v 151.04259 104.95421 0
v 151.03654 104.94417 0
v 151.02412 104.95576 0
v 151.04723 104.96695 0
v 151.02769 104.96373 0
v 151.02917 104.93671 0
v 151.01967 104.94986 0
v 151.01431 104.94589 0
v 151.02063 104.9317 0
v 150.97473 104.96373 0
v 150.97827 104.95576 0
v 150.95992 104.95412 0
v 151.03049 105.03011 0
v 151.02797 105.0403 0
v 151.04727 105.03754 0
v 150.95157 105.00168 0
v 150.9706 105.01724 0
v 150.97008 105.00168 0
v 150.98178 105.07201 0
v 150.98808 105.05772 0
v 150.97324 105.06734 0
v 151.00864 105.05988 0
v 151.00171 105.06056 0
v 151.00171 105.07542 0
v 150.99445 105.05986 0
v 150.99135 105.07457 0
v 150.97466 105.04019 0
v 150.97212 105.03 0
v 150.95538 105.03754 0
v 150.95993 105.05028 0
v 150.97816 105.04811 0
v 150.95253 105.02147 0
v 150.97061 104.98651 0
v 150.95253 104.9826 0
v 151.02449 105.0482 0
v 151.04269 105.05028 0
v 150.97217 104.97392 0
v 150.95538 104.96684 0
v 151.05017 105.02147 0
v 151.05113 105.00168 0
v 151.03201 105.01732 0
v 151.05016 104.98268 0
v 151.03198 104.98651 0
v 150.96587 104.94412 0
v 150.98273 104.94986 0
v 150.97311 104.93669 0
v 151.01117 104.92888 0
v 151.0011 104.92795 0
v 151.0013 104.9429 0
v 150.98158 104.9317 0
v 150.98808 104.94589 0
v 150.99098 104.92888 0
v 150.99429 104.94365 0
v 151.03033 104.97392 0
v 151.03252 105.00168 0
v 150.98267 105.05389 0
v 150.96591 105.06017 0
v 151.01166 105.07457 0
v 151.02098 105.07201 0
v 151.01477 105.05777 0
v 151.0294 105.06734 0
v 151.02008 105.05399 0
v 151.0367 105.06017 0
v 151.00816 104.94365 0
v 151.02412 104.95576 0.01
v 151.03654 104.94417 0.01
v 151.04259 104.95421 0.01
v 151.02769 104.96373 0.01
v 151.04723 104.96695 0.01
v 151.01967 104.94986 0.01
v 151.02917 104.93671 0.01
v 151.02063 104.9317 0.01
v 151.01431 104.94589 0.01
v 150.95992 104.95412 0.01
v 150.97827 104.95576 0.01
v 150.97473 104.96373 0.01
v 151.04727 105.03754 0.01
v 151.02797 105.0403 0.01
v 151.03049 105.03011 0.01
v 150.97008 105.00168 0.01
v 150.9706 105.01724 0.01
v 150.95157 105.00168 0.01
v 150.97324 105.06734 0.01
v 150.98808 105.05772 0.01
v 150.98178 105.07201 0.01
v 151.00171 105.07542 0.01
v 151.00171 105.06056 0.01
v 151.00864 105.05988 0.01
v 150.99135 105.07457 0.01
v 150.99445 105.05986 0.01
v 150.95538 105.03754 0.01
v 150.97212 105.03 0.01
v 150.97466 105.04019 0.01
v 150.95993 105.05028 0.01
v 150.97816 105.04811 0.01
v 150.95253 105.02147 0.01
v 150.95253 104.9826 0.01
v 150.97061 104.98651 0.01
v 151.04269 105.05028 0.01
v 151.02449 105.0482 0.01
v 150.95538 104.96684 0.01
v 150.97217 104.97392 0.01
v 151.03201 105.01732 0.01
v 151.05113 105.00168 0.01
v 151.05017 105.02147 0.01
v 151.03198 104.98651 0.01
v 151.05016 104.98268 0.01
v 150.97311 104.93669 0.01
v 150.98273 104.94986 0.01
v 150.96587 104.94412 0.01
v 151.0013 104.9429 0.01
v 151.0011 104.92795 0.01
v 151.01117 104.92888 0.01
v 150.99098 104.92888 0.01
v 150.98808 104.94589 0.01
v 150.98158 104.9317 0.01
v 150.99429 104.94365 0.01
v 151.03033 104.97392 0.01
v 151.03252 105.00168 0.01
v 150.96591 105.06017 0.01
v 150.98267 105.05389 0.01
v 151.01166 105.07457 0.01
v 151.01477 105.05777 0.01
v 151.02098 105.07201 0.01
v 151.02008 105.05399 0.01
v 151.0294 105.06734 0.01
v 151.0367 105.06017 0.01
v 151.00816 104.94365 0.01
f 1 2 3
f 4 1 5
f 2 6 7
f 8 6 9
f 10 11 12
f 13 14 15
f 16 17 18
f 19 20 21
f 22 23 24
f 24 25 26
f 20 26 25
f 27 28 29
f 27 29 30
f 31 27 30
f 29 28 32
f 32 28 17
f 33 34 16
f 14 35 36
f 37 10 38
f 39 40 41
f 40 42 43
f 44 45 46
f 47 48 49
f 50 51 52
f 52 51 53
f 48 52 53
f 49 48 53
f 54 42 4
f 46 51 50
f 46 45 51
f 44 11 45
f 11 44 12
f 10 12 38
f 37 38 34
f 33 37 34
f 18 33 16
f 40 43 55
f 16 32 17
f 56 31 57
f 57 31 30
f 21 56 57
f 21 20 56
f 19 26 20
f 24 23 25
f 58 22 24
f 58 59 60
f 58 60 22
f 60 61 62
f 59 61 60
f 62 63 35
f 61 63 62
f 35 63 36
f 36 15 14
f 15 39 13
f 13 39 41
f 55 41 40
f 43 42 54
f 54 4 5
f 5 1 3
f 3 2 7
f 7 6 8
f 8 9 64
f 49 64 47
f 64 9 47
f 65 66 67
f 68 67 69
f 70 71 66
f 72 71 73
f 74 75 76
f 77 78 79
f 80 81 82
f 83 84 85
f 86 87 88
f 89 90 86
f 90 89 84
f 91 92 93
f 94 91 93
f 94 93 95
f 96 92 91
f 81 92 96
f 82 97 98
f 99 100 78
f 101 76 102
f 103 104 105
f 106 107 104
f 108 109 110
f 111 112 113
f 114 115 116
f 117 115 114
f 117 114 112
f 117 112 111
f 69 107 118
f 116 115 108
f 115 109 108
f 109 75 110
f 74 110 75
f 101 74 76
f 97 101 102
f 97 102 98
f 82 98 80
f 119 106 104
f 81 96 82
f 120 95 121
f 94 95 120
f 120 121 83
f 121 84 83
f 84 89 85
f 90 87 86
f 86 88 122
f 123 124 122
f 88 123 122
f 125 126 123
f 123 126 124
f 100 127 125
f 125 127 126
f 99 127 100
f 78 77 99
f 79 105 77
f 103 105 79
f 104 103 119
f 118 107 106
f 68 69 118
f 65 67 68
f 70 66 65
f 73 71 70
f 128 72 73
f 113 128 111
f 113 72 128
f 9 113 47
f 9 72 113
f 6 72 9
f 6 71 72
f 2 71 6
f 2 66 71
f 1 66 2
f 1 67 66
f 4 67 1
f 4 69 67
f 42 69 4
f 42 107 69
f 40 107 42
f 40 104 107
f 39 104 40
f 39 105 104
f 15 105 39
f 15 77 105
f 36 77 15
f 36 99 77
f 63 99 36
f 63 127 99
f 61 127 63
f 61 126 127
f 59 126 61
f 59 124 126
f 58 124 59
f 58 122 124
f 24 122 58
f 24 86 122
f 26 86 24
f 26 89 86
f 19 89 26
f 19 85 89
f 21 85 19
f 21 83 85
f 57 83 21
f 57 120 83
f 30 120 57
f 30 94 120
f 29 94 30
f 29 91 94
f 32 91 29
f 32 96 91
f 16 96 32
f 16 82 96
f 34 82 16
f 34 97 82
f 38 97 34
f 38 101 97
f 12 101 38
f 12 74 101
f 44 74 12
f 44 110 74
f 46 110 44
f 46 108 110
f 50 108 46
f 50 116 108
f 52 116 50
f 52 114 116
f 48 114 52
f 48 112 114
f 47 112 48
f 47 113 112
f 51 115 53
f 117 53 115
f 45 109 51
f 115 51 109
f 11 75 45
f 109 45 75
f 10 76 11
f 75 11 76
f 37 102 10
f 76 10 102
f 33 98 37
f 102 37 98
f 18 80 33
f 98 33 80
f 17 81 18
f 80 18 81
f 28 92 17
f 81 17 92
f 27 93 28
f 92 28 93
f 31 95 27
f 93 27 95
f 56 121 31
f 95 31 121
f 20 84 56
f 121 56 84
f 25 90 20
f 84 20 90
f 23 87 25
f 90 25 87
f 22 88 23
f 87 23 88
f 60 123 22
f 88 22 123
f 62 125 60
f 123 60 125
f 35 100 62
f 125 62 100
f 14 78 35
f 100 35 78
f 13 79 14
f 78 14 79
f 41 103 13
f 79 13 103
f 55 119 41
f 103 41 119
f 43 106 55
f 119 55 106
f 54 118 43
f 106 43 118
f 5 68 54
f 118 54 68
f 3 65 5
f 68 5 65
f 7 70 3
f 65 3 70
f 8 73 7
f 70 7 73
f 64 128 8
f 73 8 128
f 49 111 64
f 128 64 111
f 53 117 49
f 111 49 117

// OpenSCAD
translate([151, 105, 0]) linear_extrude(0.01) text("0",size=0.15, halign="center", valign="center");
